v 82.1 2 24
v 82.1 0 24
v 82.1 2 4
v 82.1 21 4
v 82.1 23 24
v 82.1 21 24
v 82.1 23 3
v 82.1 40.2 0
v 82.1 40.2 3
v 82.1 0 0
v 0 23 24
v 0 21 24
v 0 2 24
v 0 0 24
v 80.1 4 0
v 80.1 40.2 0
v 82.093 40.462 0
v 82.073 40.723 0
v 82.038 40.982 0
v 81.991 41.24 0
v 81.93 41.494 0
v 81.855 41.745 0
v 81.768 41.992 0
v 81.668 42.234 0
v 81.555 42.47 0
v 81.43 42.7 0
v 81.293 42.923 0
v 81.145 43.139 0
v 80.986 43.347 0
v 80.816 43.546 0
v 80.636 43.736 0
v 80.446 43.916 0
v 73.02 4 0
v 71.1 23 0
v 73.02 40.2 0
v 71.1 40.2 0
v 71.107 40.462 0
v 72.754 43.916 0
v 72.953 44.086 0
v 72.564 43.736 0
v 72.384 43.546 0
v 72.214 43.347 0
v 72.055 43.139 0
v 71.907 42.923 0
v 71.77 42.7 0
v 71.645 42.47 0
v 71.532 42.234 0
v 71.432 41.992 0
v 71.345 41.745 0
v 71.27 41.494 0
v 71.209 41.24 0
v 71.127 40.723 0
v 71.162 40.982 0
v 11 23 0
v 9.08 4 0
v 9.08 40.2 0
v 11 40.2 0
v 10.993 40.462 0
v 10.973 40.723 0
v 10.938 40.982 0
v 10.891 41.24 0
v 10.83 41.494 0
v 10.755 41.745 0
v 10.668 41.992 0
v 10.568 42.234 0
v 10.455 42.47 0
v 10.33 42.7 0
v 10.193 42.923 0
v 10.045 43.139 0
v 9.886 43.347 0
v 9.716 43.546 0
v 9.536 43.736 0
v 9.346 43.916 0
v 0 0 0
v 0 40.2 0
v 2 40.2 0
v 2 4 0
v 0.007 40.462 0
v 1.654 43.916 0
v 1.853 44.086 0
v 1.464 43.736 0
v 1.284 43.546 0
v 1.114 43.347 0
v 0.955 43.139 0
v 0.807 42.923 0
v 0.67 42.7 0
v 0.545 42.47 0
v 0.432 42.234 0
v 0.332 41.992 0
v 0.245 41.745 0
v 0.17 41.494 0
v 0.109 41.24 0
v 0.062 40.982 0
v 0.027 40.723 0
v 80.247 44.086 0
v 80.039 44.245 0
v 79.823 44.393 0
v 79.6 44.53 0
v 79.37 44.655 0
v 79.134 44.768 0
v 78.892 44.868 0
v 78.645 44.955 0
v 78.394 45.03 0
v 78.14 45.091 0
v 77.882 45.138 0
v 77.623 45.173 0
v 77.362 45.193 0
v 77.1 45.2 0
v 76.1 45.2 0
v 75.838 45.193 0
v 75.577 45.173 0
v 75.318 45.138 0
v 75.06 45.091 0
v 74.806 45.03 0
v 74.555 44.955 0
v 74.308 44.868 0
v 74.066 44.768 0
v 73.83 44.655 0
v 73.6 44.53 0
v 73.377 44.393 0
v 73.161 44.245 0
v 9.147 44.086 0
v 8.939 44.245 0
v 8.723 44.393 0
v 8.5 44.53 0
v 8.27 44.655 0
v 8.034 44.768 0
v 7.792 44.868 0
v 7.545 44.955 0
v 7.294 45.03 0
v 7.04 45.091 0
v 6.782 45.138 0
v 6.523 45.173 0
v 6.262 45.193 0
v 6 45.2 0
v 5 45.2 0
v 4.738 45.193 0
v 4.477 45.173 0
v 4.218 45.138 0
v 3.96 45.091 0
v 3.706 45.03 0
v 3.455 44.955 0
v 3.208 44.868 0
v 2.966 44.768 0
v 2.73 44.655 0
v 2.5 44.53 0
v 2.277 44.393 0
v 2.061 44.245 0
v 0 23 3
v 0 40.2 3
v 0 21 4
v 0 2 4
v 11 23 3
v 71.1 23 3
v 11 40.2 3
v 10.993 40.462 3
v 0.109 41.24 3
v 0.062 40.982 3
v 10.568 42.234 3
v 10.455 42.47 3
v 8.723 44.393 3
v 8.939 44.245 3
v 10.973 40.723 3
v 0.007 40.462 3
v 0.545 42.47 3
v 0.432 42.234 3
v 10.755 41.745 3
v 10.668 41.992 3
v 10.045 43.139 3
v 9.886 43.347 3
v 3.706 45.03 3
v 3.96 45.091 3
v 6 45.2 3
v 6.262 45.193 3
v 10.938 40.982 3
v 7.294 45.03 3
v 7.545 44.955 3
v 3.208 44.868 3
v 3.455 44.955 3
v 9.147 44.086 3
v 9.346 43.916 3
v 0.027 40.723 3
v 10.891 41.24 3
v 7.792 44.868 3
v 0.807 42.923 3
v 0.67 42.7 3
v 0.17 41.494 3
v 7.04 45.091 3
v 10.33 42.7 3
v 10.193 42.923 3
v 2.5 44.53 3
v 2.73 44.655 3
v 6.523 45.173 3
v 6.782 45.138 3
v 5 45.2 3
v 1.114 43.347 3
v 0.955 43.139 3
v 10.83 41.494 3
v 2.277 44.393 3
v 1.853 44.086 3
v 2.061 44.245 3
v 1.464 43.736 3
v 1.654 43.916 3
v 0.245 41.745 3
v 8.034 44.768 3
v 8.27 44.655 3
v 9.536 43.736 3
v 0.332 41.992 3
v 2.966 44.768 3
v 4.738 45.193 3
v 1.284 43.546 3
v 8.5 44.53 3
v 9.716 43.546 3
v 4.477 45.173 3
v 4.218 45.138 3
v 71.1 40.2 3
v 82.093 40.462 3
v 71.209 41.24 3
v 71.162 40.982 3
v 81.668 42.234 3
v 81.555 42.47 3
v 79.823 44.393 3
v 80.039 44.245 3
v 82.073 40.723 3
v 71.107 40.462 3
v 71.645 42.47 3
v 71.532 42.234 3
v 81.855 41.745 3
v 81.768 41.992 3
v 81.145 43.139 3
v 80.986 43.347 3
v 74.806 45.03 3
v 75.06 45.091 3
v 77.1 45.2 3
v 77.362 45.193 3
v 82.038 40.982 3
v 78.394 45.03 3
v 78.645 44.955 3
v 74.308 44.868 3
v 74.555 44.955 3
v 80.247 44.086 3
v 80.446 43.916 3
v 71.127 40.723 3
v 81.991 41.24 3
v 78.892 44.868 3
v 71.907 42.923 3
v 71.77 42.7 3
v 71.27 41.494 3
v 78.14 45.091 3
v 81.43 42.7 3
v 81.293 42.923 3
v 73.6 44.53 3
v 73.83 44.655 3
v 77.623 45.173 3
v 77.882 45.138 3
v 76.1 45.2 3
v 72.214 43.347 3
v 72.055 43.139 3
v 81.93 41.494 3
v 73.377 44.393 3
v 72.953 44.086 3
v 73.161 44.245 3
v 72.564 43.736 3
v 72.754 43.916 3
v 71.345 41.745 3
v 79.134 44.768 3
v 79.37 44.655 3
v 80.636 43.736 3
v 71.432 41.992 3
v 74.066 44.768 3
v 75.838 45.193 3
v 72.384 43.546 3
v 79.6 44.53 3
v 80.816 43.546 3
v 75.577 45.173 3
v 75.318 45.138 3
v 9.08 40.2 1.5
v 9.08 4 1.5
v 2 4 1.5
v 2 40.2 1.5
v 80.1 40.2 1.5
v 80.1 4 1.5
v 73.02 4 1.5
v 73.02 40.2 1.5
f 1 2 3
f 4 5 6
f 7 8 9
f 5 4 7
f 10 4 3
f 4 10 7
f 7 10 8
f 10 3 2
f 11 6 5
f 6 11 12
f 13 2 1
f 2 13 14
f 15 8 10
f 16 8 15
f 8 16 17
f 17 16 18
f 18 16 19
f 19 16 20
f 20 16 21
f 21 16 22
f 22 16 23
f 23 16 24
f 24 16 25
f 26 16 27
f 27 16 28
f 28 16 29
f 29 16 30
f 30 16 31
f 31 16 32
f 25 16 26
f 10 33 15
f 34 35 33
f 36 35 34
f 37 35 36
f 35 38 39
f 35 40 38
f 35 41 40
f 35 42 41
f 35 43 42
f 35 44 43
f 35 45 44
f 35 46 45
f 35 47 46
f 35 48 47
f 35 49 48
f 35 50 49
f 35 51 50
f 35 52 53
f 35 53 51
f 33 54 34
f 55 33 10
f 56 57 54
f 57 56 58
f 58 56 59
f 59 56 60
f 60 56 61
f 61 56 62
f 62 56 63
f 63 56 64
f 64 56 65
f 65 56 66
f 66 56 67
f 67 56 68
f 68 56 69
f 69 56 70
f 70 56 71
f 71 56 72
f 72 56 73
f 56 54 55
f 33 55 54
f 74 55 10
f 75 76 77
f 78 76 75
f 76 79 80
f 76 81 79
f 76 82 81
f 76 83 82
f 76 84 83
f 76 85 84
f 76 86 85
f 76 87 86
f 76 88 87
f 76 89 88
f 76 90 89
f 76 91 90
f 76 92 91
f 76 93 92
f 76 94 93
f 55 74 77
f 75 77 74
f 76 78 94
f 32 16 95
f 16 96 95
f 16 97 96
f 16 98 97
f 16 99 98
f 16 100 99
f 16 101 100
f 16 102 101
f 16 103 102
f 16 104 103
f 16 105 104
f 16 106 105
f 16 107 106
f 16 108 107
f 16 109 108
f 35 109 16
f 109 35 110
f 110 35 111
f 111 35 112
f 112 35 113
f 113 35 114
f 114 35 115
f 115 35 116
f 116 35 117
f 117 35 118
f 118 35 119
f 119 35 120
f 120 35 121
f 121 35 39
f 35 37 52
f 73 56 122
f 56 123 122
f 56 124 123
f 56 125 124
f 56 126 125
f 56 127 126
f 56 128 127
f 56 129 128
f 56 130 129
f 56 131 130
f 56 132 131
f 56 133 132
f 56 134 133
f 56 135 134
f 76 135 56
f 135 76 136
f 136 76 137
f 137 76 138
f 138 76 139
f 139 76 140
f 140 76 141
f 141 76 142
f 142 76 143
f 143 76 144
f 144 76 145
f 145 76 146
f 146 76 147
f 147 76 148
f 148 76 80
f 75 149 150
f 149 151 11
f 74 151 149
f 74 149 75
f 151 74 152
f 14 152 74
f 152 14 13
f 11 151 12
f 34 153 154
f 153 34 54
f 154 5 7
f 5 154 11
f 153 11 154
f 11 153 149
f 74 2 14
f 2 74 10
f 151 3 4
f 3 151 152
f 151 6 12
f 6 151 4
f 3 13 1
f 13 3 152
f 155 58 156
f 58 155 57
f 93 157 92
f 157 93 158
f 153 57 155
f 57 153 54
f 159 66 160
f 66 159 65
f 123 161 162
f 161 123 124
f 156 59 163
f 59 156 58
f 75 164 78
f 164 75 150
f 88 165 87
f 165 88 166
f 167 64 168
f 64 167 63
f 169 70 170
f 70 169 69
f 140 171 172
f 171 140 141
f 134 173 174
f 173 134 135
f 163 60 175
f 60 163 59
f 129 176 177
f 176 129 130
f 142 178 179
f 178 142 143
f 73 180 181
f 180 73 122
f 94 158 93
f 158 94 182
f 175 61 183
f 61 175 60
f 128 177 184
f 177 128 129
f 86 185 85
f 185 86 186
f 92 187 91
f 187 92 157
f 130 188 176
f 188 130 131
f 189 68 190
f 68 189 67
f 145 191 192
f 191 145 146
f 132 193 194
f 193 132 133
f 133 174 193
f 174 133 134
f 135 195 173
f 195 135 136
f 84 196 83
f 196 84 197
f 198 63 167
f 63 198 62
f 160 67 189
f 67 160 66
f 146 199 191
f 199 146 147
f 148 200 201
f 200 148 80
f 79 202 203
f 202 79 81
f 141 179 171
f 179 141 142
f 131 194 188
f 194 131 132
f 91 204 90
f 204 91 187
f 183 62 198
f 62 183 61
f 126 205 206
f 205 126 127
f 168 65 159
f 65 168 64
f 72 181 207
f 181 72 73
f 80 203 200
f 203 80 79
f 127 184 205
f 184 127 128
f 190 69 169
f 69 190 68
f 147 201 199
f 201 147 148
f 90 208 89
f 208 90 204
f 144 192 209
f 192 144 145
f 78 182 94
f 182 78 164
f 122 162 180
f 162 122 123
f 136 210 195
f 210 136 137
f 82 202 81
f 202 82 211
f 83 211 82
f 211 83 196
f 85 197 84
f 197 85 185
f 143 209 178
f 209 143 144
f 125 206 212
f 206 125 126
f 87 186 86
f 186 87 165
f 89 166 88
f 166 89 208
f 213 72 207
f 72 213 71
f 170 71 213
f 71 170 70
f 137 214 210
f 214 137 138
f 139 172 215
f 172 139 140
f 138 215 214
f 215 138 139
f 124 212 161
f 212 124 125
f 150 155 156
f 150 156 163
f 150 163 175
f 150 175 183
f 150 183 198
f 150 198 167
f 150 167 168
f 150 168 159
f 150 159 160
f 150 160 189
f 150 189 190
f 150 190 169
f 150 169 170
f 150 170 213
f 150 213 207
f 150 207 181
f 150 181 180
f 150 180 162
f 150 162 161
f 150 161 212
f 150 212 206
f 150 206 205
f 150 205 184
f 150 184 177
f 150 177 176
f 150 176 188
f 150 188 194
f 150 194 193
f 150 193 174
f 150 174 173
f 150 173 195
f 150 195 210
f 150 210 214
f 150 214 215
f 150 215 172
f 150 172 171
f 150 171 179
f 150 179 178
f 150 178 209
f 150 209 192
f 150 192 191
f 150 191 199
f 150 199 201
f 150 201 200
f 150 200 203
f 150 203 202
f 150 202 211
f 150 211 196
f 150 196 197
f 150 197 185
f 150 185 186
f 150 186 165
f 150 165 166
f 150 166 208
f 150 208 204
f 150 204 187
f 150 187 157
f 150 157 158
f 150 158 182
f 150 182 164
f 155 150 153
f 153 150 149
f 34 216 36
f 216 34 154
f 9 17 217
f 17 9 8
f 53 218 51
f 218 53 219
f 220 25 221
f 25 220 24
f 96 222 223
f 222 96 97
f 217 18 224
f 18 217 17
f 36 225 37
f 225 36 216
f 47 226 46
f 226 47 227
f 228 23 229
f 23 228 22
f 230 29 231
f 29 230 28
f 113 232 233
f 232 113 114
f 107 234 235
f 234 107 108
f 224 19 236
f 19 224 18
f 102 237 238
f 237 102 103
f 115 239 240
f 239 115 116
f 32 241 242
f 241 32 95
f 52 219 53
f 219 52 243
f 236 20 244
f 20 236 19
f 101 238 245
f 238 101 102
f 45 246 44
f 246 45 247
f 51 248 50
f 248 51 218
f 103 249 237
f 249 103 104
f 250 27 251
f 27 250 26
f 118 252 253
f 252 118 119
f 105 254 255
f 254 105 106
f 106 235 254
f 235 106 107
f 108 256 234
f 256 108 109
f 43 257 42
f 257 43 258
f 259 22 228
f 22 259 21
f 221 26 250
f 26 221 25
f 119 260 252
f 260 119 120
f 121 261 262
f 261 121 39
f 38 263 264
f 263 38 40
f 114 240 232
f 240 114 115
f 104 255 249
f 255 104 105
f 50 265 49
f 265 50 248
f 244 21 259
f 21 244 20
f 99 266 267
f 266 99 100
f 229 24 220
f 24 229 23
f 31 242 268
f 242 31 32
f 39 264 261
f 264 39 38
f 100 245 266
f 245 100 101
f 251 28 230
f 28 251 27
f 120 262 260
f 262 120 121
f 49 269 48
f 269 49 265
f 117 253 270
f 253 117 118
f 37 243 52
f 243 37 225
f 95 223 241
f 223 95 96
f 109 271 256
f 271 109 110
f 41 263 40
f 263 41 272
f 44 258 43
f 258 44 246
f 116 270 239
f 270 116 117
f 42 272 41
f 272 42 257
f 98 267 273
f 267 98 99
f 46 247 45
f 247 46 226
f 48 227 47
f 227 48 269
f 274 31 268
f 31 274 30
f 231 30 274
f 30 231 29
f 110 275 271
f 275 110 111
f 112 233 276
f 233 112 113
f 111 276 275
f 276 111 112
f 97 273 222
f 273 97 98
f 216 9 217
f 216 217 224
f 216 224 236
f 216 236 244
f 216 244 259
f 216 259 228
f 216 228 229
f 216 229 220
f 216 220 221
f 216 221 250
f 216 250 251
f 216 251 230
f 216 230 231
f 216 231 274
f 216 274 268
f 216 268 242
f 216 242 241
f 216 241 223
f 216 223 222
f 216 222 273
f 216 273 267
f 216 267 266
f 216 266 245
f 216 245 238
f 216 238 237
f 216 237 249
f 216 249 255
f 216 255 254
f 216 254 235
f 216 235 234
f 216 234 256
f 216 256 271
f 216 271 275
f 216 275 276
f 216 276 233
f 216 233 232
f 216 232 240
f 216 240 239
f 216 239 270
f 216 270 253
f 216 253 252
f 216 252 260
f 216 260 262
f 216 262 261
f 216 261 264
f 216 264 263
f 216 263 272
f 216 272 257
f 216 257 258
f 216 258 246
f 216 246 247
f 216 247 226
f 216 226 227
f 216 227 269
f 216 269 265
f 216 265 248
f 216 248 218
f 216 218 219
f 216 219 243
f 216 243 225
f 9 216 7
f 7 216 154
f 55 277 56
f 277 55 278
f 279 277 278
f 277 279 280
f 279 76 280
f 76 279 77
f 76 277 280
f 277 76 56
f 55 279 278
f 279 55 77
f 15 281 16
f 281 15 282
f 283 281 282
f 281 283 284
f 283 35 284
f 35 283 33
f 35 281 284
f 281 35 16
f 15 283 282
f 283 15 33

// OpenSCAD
eps = 0.01;
spacing = 4;
size = [74.1+2*spacing, 32.2+2*spacing];
rounding = 5;

module holder_()
{
  z=2;
  x=74.1;
  y=32.2;
  w=3.08;
  for(dx=[0, x-w])
    translate([dx,0,0])
    {
      cube([w, y, z]);
      translate(6*[0, 1/2, 0])
        cube([w, y-6, z+20]);
    }
  translate([0, y/2-w/2, z])
    cube([x, w, z]);
}

module holder_space_()
{
  space=2;
  z=2-0.5;
  x=74.1;
  y=32.2+2*space;
  w=3.08+2*space;
  for(dx=[0, x-w+2*space])
    translate([dx, 0, 0])
      cube([w, y, z]);
}

module main_block_()
{
  // desk mount
  difference()
  {
    cube([size[0], 19+2*2, 20+4]);
    translate([-eps, 2, 4])
      cube([size[0]+2*eps, 19, 20+1]);
  }
  // main surface
  for(i=[0, size[0]-rounding*2-1])
    translate([i, 0, 0])
      hull()
      {
        cube([2*rounding+1, 1, 3]);
        for(j=[0, 1])
          translate(spacing*[1,0,0] + [j+1, size[1], 0])
            cylinder(r=rounding, h=3, $fn=120);
      }
}


module holder()
{
  difference()
  {
    main_block_();
    translate([2, spacing, 0])
      #holder_space_();
    translate(2*[1, 1, 0] + [size[0]-spacing-2, spacing, 1.5])
      rotate([0, 180, 0])
        %holder_();
  }
}

holder();
